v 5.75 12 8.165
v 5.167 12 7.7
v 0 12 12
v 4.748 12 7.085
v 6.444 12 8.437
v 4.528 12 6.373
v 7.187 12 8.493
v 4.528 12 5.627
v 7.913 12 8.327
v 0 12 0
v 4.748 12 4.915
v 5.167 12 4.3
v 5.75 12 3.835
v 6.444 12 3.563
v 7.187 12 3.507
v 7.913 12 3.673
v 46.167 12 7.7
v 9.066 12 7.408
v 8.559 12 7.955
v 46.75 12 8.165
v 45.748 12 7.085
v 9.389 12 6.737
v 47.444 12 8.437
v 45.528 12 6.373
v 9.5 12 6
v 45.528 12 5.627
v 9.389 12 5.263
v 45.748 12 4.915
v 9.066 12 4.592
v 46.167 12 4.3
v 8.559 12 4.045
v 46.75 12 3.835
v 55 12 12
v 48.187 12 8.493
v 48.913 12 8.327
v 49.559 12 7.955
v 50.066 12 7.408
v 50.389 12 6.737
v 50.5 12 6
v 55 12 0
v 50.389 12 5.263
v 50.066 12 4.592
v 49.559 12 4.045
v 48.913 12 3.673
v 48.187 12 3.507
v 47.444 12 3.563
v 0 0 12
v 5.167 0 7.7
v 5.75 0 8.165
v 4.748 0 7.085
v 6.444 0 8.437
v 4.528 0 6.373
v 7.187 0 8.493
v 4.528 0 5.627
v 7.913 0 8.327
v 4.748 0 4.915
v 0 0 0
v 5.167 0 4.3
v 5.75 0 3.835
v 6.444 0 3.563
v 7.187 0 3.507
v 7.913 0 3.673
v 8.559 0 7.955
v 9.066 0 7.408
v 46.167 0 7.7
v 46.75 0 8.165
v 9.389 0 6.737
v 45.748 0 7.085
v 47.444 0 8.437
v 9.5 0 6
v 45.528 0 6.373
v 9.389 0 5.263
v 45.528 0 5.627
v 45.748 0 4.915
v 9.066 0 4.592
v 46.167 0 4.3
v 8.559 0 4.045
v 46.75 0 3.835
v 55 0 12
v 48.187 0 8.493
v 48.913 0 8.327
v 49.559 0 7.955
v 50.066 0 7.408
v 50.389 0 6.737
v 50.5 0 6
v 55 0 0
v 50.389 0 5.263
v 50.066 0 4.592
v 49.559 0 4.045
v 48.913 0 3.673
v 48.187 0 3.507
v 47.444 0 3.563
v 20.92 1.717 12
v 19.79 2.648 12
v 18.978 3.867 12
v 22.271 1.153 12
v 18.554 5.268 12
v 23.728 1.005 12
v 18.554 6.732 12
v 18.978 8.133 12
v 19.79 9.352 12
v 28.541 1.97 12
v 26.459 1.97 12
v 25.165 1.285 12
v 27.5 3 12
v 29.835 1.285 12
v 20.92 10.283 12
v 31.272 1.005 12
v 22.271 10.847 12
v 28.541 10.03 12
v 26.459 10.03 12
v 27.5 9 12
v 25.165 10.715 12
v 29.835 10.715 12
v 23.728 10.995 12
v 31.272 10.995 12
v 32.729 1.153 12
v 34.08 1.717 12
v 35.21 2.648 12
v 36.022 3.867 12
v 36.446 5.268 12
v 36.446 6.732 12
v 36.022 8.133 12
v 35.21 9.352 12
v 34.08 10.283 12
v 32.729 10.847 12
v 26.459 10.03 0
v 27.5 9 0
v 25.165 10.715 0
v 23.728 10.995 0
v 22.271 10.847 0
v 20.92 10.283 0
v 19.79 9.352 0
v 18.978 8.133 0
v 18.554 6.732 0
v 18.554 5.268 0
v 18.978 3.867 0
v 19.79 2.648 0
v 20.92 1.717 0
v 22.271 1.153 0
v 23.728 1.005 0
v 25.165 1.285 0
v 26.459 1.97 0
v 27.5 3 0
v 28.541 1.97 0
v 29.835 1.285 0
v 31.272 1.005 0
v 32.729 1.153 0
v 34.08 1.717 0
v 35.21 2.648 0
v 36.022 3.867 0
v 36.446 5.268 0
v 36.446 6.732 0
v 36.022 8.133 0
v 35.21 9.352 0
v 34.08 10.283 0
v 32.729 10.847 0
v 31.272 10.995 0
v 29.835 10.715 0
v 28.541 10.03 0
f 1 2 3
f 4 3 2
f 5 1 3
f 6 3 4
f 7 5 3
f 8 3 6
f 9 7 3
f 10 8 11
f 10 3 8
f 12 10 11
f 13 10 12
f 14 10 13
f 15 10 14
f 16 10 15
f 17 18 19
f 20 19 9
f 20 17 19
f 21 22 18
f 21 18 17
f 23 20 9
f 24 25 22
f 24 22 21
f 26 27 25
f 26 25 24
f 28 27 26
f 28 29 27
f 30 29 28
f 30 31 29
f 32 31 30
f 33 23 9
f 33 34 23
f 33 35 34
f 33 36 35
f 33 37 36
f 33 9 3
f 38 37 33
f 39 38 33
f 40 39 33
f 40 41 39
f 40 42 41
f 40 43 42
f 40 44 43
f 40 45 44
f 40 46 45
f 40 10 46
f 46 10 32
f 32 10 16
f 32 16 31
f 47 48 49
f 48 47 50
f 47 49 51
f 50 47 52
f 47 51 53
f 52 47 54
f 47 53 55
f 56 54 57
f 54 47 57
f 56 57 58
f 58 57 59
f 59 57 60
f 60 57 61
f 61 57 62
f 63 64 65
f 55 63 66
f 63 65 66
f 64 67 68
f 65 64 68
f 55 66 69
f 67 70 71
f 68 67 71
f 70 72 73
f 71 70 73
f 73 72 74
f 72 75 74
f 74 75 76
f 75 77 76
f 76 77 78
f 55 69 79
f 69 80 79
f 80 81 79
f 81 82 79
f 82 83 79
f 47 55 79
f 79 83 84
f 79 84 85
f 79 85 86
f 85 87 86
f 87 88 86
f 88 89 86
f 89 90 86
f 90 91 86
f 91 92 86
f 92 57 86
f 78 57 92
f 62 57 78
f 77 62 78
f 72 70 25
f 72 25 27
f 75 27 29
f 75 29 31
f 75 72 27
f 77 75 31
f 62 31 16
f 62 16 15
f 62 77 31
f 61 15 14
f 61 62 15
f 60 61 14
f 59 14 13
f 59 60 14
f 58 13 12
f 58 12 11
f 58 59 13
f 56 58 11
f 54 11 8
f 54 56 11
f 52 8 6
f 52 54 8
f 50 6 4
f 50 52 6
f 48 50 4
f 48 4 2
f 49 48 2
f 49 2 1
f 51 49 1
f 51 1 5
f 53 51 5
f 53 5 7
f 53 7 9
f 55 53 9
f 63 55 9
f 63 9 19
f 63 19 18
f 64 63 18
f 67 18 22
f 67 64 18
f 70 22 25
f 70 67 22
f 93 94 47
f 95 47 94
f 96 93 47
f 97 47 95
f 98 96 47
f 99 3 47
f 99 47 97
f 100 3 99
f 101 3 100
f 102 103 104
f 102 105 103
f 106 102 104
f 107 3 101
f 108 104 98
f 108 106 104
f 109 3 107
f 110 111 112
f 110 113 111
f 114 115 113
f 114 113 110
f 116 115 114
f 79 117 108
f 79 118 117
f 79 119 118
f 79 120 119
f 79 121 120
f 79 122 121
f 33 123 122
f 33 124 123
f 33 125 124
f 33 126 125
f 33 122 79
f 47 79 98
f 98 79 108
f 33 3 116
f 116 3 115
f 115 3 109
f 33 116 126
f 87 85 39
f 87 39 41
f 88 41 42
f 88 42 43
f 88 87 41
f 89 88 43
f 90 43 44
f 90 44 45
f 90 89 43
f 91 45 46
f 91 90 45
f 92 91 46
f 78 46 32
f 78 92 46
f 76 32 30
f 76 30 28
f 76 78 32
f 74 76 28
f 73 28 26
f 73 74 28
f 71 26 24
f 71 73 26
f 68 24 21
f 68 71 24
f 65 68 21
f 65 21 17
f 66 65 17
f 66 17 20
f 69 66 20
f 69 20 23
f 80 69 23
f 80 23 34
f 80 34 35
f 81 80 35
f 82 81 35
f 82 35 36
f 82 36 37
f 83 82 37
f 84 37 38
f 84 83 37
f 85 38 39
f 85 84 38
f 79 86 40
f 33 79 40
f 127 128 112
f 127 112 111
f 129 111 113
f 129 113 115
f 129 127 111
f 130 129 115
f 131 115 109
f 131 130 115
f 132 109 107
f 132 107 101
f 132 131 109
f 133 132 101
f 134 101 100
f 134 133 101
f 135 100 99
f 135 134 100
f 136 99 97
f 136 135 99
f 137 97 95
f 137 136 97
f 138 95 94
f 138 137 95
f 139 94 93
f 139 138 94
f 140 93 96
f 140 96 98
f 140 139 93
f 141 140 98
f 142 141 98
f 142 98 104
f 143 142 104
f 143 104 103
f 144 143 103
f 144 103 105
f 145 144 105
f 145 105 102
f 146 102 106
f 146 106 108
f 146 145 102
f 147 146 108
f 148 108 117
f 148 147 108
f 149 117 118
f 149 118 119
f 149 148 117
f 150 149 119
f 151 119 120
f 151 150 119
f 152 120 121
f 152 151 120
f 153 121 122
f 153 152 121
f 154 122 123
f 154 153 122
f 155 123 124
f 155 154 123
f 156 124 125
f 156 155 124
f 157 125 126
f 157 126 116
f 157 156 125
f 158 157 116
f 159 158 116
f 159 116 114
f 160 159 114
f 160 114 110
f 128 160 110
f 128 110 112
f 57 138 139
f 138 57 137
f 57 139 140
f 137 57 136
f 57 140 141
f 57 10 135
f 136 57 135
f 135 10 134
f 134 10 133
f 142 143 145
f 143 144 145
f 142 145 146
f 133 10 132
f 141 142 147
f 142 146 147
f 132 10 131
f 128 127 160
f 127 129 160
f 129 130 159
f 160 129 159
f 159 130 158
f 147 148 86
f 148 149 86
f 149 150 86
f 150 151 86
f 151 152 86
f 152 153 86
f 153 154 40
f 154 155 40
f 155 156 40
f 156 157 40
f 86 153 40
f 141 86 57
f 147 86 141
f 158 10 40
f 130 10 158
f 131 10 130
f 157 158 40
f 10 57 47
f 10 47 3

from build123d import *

# Parameters (mm, degrees)
CROQUIS1_W              = 55
CROQUIS1_H              = 12
SALIENTE_EXTRUIR1_DEPTH = 12
TALADRO1_OUTLINE_R      = 2.5
TALADRO1_DEPTH          = 12


# Read off the part's stored shape, not the designer's step: Taladro1
with BuildPart() as part:
    # Croquis1 → Saliente-Extruir1 (new body)
    with BuildSketch(Plane.XY):
        with Locations((27.5, 6)):
            Rectangle(CROQUIS1_W, CROQUIS1_H)
        with BuildLine():
            ThreePointArc((27.5, 9), (18.5, 6), (27.5, 3))
            ThreePointArc((27.5, 3), (36.5, 6), (27.5, 9))
        make_face(mode=Mode.SUBTRACT)
    extrude(amount=SALIENTE_EXTRUIR1_DEPTH)

    # Taladro1 outline → Taladro1 (cut)
    with BuildSketch(Plane(origin=(0, 0, 0), x_dir=(1, 0, 0), z_dir=(0, 1, 0))):
        with Locations((48, -6)):
            Circle(TALADRO1_OUTLINE_R)
        with Locations((7, -6)):
            Circle(TALADRO1_OUTLINE_R)
    extrude(amount=TALADRO1_DEPTH, mode=Mode.SUBTRACT)


solid = part.part
